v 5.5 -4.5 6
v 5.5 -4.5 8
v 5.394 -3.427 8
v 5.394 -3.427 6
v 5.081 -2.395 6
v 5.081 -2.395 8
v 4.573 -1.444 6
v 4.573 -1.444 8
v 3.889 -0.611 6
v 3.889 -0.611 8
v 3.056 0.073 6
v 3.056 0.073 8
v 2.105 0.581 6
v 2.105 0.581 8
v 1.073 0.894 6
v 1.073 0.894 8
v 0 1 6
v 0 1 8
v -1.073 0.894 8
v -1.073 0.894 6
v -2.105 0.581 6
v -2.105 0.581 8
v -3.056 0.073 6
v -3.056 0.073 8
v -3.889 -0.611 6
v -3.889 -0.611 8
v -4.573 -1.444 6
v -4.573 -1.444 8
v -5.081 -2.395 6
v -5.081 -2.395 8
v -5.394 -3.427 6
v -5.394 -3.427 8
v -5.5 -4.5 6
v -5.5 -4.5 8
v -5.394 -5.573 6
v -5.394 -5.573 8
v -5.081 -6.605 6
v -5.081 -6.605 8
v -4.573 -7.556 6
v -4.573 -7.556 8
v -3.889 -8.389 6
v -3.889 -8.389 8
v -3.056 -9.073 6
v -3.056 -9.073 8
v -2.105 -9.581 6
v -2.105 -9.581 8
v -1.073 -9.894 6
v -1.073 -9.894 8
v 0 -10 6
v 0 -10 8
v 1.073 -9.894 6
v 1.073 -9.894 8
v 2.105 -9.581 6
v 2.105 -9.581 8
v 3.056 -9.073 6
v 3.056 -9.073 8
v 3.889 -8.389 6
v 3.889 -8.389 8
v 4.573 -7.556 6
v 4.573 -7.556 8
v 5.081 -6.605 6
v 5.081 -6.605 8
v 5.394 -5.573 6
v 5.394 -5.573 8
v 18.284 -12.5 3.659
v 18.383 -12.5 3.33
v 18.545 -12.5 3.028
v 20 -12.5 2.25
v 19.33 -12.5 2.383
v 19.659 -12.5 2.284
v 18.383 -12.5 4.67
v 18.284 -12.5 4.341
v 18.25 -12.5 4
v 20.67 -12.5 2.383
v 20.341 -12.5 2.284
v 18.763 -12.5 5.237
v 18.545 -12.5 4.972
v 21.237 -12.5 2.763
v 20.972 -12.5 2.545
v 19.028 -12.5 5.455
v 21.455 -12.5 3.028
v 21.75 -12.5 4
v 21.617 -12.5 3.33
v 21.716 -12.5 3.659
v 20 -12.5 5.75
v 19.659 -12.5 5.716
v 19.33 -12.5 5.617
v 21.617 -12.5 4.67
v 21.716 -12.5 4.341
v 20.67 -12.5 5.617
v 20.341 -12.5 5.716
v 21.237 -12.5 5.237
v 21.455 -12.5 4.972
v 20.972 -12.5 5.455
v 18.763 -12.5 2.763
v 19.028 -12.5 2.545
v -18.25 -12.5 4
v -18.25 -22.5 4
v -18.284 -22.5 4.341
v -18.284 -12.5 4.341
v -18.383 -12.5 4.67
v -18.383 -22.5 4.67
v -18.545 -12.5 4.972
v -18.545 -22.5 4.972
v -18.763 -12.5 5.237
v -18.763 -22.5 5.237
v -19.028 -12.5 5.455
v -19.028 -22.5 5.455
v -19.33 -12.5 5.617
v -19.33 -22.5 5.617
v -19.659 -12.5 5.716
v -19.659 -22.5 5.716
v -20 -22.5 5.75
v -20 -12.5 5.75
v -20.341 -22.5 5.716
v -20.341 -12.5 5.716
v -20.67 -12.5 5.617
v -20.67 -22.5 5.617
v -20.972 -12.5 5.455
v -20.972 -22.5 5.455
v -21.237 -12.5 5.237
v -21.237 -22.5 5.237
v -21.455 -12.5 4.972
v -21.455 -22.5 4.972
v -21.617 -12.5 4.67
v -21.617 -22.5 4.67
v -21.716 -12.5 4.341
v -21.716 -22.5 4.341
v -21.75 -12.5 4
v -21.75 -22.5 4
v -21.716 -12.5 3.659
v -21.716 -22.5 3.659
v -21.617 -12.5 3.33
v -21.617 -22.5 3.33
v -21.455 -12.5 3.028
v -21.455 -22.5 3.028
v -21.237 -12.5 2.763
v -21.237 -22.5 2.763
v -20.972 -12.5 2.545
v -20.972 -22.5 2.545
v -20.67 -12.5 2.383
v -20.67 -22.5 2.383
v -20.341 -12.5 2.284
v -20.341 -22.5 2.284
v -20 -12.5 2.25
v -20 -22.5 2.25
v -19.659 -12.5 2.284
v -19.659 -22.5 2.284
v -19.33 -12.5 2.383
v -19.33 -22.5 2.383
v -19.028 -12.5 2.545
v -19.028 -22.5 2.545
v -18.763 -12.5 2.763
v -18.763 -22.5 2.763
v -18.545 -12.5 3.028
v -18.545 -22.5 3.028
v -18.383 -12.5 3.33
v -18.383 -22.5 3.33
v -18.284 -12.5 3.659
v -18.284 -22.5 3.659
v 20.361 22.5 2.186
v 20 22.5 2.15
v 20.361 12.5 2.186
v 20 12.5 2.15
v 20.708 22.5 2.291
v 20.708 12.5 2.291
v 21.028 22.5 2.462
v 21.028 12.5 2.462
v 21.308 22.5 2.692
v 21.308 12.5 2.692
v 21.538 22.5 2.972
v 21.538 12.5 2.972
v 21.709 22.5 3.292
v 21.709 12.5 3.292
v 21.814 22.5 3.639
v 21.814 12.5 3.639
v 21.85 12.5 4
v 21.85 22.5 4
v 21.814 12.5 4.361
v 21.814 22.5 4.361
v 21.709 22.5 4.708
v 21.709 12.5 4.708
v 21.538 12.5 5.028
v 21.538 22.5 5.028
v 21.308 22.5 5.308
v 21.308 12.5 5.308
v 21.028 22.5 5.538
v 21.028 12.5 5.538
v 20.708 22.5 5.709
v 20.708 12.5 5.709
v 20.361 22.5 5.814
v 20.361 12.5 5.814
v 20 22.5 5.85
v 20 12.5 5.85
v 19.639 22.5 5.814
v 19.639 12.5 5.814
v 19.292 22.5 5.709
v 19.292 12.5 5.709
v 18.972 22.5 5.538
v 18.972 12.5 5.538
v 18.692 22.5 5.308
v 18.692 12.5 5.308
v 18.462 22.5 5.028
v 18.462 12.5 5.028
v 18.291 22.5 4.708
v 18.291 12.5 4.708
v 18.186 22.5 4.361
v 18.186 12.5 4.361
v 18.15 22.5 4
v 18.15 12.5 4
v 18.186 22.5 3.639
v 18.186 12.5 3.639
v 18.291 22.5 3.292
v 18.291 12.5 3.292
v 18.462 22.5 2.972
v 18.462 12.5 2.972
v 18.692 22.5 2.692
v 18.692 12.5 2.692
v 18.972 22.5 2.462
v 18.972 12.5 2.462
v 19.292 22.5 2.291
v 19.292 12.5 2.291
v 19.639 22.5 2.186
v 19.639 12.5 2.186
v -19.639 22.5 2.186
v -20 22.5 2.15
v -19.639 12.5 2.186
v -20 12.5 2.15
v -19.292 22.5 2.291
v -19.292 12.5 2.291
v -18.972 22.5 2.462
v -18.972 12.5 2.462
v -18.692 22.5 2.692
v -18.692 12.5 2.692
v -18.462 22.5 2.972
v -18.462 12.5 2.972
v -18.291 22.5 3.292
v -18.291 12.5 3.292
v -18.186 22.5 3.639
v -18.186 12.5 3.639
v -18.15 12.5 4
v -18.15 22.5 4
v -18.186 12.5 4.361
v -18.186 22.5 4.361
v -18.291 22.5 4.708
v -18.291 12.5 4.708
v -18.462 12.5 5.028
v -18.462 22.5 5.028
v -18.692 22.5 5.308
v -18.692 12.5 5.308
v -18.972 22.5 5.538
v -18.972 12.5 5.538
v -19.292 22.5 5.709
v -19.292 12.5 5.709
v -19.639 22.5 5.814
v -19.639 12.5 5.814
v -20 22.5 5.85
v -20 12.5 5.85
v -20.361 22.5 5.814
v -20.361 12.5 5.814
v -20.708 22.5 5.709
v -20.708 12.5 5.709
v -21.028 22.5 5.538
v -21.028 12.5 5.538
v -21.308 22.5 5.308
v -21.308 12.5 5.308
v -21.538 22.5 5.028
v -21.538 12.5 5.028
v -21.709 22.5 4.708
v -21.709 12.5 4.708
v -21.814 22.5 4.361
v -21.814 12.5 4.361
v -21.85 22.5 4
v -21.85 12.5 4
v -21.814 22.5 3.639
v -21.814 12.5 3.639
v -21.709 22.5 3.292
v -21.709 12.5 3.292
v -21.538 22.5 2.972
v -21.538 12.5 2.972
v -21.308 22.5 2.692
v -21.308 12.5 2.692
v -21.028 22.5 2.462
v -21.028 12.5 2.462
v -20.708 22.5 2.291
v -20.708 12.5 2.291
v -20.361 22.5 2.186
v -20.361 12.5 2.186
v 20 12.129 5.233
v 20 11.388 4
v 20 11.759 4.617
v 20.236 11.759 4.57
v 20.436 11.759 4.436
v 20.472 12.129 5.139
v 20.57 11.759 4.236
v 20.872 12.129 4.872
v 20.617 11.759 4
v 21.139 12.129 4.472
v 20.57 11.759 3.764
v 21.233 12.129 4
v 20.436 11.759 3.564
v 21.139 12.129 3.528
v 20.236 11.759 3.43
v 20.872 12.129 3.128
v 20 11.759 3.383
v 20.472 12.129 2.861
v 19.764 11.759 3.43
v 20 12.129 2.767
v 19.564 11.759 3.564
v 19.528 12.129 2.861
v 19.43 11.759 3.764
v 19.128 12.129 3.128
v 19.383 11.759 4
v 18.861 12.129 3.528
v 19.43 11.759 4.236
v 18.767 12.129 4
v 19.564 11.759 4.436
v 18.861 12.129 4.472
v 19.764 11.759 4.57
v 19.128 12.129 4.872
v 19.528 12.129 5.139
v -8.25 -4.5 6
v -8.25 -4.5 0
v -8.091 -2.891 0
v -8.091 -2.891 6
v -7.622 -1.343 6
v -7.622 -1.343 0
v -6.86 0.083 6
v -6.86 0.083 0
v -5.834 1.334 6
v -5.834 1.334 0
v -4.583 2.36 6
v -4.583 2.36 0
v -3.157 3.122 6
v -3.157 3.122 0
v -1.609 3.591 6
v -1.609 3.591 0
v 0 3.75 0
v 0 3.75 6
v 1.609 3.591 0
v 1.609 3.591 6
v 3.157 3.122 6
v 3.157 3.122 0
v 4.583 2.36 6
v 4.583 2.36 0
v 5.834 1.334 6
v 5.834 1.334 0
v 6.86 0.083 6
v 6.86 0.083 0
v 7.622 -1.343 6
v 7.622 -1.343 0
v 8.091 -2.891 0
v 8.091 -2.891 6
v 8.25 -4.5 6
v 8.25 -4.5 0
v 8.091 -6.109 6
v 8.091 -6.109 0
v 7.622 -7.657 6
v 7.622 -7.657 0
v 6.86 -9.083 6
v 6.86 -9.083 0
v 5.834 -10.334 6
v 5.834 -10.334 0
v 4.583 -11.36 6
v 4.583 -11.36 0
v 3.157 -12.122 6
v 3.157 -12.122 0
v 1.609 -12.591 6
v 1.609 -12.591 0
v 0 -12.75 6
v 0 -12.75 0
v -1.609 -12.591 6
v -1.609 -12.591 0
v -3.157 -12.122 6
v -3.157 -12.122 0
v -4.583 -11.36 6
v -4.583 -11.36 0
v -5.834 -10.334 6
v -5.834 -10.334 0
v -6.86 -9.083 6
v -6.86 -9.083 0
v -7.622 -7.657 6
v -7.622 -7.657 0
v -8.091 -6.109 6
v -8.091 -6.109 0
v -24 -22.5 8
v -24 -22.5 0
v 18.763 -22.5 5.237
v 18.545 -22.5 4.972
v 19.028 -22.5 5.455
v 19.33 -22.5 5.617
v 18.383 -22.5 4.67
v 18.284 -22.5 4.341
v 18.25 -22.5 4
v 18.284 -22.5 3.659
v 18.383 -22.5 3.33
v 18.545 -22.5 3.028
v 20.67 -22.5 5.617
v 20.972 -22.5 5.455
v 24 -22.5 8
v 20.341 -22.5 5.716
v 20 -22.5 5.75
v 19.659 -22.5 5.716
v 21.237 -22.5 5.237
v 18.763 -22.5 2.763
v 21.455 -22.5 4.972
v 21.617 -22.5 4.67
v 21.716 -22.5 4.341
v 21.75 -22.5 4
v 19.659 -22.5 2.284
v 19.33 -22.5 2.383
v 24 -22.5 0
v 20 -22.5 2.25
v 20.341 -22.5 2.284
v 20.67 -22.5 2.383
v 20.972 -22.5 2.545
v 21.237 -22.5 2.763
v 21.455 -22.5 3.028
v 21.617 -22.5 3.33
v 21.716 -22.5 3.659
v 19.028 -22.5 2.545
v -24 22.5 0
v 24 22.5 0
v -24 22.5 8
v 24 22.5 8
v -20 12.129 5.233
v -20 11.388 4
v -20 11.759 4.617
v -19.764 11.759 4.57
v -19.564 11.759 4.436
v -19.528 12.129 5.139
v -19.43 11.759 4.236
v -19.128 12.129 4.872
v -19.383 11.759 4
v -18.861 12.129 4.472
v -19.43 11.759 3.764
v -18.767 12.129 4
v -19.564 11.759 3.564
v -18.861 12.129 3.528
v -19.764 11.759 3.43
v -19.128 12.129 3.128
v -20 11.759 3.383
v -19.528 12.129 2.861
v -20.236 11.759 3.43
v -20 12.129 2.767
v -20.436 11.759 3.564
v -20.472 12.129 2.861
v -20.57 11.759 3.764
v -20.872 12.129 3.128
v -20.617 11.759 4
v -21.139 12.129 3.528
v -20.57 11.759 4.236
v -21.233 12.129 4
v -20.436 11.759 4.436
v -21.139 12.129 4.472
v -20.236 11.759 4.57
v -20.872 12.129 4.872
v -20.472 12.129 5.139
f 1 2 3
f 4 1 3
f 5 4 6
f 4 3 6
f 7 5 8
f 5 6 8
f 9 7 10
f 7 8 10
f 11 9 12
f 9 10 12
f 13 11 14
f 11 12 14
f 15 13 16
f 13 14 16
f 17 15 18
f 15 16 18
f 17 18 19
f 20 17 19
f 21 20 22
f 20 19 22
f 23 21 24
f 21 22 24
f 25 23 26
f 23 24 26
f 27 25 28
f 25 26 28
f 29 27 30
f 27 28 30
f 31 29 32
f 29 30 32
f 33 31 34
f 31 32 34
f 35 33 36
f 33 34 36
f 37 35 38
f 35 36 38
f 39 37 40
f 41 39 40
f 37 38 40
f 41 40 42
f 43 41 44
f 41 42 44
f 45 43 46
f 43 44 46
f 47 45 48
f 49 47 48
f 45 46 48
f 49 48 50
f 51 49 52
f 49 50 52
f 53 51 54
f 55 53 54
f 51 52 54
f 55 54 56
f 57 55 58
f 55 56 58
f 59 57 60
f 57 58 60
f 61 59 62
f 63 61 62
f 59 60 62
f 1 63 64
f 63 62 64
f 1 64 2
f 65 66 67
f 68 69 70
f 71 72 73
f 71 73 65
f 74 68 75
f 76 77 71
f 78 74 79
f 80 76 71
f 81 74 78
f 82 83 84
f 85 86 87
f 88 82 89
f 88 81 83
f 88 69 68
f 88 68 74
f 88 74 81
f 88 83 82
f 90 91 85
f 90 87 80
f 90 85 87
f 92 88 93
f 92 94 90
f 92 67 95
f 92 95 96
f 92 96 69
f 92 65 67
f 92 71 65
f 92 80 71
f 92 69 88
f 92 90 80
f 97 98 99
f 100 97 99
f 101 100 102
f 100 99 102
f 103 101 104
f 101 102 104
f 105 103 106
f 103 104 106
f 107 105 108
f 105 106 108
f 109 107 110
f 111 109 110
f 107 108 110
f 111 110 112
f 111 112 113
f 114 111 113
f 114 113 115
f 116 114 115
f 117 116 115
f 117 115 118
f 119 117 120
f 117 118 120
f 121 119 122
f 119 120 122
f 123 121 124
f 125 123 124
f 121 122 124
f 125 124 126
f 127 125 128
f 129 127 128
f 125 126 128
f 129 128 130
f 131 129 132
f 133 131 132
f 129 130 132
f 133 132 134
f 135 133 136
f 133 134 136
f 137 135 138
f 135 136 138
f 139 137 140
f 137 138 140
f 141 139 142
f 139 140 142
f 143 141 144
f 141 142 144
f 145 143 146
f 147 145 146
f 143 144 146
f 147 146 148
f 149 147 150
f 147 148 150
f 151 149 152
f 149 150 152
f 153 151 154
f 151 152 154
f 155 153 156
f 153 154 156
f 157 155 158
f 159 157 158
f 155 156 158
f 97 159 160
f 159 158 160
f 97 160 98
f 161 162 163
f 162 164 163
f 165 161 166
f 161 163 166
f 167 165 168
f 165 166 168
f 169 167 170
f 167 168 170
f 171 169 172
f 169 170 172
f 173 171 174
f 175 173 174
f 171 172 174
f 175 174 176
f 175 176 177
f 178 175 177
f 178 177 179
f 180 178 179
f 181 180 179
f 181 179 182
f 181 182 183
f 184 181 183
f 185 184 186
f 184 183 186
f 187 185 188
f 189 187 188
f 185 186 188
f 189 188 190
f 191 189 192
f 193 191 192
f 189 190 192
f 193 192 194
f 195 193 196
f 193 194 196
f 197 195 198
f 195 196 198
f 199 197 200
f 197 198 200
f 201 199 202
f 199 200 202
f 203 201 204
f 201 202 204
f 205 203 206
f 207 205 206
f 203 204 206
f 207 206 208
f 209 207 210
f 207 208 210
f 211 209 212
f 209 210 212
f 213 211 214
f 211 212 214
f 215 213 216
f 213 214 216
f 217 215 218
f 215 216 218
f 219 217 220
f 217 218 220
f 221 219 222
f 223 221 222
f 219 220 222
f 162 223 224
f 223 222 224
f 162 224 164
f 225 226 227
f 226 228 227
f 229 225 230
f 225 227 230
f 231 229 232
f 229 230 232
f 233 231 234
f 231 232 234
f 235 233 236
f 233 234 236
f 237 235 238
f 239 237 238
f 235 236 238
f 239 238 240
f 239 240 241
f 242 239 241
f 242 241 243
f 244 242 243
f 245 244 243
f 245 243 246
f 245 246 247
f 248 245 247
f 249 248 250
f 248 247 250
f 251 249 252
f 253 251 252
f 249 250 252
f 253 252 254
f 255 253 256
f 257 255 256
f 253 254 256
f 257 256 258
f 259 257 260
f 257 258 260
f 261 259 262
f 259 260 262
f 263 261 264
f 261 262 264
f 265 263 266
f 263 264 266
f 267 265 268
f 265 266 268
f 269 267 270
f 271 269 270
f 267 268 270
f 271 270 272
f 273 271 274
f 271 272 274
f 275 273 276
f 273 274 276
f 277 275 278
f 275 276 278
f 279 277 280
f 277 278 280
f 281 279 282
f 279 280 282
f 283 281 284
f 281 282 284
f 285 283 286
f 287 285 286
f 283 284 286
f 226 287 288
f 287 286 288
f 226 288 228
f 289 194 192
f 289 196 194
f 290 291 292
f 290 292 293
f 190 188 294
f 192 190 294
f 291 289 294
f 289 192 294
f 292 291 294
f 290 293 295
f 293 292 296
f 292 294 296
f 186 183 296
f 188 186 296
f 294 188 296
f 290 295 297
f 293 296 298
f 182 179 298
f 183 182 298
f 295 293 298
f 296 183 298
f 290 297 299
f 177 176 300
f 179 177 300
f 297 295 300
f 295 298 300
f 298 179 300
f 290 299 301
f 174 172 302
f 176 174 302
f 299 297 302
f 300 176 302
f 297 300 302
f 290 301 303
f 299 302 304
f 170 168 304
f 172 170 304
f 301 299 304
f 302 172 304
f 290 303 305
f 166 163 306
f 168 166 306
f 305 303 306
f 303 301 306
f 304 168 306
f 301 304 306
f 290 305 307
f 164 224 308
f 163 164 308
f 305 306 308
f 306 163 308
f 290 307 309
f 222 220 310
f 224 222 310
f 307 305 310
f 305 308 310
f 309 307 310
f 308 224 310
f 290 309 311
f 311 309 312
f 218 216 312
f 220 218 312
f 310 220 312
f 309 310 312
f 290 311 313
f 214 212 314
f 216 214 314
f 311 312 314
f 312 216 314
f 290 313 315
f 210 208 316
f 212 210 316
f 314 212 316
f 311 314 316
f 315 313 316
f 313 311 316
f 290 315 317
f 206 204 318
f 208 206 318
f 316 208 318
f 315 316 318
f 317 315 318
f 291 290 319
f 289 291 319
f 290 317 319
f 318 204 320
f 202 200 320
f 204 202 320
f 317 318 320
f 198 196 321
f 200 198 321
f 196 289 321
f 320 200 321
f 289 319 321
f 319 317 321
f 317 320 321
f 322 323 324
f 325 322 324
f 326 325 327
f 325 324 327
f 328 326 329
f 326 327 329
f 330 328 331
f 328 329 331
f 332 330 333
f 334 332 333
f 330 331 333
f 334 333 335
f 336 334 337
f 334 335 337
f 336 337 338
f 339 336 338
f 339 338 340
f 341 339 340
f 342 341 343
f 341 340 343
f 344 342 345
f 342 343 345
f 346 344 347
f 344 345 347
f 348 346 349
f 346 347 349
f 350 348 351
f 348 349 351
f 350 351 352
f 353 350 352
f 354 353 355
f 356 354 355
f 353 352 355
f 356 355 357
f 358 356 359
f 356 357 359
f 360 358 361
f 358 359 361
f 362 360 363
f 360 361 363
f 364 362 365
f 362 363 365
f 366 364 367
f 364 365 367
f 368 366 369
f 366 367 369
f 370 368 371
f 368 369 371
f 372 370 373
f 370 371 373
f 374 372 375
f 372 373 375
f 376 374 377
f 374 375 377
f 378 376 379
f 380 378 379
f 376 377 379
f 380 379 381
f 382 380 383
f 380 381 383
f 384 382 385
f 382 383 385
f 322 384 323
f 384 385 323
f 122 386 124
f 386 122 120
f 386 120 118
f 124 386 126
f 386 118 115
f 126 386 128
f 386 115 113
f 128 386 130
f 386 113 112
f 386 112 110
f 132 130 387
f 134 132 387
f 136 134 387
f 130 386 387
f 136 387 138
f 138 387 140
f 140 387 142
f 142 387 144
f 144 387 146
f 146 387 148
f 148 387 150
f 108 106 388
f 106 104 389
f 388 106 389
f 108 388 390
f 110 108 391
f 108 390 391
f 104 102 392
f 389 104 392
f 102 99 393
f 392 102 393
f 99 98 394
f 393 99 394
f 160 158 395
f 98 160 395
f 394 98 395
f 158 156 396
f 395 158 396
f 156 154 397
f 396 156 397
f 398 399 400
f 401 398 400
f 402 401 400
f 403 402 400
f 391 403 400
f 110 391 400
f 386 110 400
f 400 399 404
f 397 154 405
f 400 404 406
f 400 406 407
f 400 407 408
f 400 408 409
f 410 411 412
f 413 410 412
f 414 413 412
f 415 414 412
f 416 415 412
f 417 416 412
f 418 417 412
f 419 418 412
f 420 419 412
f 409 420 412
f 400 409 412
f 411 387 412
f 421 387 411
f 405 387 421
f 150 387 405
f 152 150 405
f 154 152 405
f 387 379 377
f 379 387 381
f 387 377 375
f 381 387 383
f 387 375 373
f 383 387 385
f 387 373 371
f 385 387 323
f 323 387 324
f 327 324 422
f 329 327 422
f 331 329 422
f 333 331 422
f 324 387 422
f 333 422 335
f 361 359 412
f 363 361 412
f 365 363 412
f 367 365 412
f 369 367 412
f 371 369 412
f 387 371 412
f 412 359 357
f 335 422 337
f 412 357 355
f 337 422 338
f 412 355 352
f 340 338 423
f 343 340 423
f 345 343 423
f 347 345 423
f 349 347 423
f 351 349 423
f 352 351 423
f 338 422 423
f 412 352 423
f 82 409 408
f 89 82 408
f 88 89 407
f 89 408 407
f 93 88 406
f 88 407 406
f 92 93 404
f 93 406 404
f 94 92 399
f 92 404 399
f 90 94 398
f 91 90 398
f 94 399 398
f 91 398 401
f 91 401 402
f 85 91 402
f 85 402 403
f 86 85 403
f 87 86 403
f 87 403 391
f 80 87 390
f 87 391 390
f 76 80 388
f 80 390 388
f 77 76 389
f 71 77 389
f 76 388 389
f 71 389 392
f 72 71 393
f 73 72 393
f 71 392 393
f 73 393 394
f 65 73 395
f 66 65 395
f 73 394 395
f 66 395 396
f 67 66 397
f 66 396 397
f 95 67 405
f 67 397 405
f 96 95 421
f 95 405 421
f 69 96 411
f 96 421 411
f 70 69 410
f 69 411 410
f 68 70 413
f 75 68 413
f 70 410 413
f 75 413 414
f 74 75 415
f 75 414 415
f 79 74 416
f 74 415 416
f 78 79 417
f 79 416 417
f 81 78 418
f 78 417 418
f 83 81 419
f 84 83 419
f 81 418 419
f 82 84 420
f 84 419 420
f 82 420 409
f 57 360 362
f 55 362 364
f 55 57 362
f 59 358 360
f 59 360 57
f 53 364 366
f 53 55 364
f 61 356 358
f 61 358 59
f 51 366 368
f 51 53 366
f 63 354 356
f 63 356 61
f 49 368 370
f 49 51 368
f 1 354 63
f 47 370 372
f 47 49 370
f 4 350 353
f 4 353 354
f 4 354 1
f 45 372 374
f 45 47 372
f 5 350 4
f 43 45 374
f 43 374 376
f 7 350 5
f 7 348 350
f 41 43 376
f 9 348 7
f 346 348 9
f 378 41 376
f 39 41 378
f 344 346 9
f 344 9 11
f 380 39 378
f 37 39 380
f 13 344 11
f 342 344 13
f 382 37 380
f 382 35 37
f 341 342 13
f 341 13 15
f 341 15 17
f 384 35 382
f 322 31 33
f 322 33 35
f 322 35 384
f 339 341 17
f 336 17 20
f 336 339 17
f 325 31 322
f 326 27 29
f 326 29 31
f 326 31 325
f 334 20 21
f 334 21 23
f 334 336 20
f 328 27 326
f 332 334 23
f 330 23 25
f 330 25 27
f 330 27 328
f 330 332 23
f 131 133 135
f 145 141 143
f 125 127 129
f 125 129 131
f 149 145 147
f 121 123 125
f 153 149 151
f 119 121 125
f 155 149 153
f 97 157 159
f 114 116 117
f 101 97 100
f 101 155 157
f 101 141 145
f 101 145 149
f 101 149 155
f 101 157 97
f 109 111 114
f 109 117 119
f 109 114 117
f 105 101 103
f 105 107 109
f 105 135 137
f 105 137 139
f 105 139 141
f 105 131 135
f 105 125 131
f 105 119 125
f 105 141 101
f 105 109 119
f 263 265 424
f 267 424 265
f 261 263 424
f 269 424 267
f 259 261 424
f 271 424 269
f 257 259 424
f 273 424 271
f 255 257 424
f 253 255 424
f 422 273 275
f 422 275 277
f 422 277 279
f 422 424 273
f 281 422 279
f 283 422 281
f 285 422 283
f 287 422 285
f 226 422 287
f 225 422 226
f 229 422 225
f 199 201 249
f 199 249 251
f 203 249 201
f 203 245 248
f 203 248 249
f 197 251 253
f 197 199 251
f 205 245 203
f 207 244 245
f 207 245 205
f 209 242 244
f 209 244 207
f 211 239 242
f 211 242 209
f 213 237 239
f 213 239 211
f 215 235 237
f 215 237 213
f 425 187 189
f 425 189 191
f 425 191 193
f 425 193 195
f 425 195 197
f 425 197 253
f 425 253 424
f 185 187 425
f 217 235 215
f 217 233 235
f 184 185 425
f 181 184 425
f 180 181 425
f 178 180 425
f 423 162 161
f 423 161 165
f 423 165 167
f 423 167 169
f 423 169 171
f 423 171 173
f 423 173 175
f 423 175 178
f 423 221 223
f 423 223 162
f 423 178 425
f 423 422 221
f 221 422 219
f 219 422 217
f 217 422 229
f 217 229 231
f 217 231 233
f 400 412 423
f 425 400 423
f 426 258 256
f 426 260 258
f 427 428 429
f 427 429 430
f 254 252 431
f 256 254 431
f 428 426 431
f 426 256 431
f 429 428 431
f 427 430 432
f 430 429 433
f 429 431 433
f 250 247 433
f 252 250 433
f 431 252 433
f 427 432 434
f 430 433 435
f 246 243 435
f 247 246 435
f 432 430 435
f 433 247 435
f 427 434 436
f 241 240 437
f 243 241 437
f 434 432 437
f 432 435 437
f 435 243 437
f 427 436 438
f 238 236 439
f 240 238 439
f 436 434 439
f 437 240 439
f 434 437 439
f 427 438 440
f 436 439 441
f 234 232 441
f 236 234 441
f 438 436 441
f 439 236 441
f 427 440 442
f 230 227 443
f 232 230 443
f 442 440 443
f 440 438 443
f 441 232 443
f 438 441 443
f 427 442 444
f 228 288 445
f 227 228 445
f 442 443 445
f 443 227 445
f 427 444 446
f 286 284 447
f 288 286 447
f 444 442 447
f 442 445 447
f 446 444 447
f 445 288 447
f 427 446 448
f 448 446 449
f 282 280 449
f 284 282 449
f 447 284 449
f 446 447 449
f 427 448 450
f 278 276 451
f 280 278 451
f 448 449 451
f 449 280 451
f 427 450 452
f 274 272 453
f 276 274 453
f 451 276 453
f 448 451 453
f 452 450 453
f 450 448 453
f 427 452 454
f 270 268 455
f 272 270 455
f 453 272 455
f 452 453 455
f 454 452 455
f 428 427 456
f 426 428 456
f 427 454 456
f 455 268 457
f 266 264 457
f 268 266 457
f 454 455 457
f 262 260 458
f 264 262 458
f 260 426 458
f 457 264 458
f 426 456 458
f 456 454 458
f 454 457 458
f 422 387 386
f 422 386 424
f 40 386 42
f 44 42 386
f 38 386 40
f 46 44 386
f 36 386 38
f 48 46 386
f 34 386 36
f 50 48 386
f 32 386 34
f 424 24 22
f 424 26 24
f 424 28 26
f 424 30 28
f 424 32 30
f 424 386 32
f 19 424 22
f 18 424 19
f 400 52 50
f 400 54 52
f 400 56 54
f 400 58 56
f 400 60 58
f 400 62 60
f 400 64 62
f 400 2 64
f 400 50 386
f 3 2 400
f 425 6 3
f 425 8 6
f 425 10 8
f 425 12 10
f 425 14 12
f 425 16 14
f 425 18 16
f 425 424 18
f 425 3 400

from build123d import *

# Parameters (mm, degrees)
ESQUISSE1_W                      = 48
ESQUISSE1_H                      = 45
BOSS_EXTRU_1_DEPTH               = 8
ESQUISSE5_R                      = 5.5
ENL_V_MAT_EXTRU_3_DEPTH          = 2
ESQUISSE4_R                      = 8.25
ENL_V_MAT_EXTRU_4_DEPTH          = 6
ESQUISSE2_R                      = 1.75
ENL_V_MAT_EXTRU_5_DEPTH          = 10
D_GAGEMENT_M3_51_D               = 3.7
D_GAGEMENT_M3_51_DEPTH           = 10
D_GAGEMENT_M3_51_TIP             = 1.111592145
D_GAGEMENT_M3_51_ON_FACE_2_D     = 3.7
D_GAGEMENT_M3_51_ON_FACE_2_DEPTH = 10
D_GAGEMENT_M3_51_ON_FACE_2_TIP   = 1.111592145


with BuildPart() as part:
    # Esquisse1 → Boss.-Extru.1 (new body)
    with BuildSketch(Plane.XY):
        Rectangle(ESQUISSE1_W, ESQUISSE1_H)
    extrude(amount=BOSS_EXTRU_1_DEPTH)

    # Esquisse5 → Enlèv. mat.-Extru.3 (cut)
    with BuildSketch(Plane.XY.offset(8)):
        with Locations((0, -4.5)):
            Circle(ESQUISSE5_R)
    extrude(amount=-ENL_V_MAT_EXTRU_3_DEPTH, mode=Mode.SUBTRACT)

    # Esquisse4 → Enlèv. mat.-Extru.4 (cut)
    with BuildSketch(Plane(origin=(0, 0, 0), x_dir=(-1, 0, 0), z_dir=(0, 0, -1))):
        with Locations((0, -4.5)):
            Circle(ESQUISSE4_R)
    extrude(amount=-ENL_V_MAT_EXTRU_4_DEPTH, mode=Mode.SUBTRACT)

    # Esquisse2 → Enlèv. mat.-Extru.5 (cut)
    with BuildSketch(Plane.XZ.offset(22.5)):
        with Locations((-20, 4)):
            Circle(ESQUISSE2_R)
        with Locations((20, 4)):
            Circle(ESQUISSE2_R)
    extrude(amount=-ENL_V_MAT_EXTRU_5_DEPTH, mode=Mode.SUBTRACT)

    # Dégagement M3.51
    with Locations(Plane(origin=(20, 22.5, 4), x_dir=(0, 0, 1), z_dir=(0, 1, 0))):
        with Locations((0, 0), (0, -40)):
            Hole(D_GAGEMENT_M3_51_D / 2, depth=D_GAGEMENT_M3_51_DEPTH)
            with Locations((0, 0, -(D_GAGEMENT_M3_51_DEPTH + D_GAGEMENT_M3_51_TIP / 2))):  # 118° drill point
                Cone(0, D_GAGEMENT_M3_51_D / 2, D_GAGEMENT_M3_51_TIP, mode=Mode.SUBTRACT)

    # Dégagement M3.51 on face 2
    with Locations(Plane(origin=(-58.361225935, 70.859654688, 0), x_dir=(0, 0, 1), z_dir=(0, 1, 0))):
        with Locations((0, 0)):
            Hole(D_GAGEMENT_M3_51_ON_FACE_2_D / 2, depth=D_GAGEMENT_M3_51_ON_FACE_2_DEPTH)
            with Locations((0, 0, -(D_GAGEMENT_M3_51_ON_FACE_2_DEPTH + D_GAGEMENT_M3_51_ON_FACE_2_TIP / 2))):  # 118° drill point
                Cone(0, D_GAGEMENT_M3_51_ON_FACE_2_D / 2, D_GAGEMENT_M3_51_ON_FACE_2_TIP, mode=Mode.SUBTRACT)


solid = part.part
